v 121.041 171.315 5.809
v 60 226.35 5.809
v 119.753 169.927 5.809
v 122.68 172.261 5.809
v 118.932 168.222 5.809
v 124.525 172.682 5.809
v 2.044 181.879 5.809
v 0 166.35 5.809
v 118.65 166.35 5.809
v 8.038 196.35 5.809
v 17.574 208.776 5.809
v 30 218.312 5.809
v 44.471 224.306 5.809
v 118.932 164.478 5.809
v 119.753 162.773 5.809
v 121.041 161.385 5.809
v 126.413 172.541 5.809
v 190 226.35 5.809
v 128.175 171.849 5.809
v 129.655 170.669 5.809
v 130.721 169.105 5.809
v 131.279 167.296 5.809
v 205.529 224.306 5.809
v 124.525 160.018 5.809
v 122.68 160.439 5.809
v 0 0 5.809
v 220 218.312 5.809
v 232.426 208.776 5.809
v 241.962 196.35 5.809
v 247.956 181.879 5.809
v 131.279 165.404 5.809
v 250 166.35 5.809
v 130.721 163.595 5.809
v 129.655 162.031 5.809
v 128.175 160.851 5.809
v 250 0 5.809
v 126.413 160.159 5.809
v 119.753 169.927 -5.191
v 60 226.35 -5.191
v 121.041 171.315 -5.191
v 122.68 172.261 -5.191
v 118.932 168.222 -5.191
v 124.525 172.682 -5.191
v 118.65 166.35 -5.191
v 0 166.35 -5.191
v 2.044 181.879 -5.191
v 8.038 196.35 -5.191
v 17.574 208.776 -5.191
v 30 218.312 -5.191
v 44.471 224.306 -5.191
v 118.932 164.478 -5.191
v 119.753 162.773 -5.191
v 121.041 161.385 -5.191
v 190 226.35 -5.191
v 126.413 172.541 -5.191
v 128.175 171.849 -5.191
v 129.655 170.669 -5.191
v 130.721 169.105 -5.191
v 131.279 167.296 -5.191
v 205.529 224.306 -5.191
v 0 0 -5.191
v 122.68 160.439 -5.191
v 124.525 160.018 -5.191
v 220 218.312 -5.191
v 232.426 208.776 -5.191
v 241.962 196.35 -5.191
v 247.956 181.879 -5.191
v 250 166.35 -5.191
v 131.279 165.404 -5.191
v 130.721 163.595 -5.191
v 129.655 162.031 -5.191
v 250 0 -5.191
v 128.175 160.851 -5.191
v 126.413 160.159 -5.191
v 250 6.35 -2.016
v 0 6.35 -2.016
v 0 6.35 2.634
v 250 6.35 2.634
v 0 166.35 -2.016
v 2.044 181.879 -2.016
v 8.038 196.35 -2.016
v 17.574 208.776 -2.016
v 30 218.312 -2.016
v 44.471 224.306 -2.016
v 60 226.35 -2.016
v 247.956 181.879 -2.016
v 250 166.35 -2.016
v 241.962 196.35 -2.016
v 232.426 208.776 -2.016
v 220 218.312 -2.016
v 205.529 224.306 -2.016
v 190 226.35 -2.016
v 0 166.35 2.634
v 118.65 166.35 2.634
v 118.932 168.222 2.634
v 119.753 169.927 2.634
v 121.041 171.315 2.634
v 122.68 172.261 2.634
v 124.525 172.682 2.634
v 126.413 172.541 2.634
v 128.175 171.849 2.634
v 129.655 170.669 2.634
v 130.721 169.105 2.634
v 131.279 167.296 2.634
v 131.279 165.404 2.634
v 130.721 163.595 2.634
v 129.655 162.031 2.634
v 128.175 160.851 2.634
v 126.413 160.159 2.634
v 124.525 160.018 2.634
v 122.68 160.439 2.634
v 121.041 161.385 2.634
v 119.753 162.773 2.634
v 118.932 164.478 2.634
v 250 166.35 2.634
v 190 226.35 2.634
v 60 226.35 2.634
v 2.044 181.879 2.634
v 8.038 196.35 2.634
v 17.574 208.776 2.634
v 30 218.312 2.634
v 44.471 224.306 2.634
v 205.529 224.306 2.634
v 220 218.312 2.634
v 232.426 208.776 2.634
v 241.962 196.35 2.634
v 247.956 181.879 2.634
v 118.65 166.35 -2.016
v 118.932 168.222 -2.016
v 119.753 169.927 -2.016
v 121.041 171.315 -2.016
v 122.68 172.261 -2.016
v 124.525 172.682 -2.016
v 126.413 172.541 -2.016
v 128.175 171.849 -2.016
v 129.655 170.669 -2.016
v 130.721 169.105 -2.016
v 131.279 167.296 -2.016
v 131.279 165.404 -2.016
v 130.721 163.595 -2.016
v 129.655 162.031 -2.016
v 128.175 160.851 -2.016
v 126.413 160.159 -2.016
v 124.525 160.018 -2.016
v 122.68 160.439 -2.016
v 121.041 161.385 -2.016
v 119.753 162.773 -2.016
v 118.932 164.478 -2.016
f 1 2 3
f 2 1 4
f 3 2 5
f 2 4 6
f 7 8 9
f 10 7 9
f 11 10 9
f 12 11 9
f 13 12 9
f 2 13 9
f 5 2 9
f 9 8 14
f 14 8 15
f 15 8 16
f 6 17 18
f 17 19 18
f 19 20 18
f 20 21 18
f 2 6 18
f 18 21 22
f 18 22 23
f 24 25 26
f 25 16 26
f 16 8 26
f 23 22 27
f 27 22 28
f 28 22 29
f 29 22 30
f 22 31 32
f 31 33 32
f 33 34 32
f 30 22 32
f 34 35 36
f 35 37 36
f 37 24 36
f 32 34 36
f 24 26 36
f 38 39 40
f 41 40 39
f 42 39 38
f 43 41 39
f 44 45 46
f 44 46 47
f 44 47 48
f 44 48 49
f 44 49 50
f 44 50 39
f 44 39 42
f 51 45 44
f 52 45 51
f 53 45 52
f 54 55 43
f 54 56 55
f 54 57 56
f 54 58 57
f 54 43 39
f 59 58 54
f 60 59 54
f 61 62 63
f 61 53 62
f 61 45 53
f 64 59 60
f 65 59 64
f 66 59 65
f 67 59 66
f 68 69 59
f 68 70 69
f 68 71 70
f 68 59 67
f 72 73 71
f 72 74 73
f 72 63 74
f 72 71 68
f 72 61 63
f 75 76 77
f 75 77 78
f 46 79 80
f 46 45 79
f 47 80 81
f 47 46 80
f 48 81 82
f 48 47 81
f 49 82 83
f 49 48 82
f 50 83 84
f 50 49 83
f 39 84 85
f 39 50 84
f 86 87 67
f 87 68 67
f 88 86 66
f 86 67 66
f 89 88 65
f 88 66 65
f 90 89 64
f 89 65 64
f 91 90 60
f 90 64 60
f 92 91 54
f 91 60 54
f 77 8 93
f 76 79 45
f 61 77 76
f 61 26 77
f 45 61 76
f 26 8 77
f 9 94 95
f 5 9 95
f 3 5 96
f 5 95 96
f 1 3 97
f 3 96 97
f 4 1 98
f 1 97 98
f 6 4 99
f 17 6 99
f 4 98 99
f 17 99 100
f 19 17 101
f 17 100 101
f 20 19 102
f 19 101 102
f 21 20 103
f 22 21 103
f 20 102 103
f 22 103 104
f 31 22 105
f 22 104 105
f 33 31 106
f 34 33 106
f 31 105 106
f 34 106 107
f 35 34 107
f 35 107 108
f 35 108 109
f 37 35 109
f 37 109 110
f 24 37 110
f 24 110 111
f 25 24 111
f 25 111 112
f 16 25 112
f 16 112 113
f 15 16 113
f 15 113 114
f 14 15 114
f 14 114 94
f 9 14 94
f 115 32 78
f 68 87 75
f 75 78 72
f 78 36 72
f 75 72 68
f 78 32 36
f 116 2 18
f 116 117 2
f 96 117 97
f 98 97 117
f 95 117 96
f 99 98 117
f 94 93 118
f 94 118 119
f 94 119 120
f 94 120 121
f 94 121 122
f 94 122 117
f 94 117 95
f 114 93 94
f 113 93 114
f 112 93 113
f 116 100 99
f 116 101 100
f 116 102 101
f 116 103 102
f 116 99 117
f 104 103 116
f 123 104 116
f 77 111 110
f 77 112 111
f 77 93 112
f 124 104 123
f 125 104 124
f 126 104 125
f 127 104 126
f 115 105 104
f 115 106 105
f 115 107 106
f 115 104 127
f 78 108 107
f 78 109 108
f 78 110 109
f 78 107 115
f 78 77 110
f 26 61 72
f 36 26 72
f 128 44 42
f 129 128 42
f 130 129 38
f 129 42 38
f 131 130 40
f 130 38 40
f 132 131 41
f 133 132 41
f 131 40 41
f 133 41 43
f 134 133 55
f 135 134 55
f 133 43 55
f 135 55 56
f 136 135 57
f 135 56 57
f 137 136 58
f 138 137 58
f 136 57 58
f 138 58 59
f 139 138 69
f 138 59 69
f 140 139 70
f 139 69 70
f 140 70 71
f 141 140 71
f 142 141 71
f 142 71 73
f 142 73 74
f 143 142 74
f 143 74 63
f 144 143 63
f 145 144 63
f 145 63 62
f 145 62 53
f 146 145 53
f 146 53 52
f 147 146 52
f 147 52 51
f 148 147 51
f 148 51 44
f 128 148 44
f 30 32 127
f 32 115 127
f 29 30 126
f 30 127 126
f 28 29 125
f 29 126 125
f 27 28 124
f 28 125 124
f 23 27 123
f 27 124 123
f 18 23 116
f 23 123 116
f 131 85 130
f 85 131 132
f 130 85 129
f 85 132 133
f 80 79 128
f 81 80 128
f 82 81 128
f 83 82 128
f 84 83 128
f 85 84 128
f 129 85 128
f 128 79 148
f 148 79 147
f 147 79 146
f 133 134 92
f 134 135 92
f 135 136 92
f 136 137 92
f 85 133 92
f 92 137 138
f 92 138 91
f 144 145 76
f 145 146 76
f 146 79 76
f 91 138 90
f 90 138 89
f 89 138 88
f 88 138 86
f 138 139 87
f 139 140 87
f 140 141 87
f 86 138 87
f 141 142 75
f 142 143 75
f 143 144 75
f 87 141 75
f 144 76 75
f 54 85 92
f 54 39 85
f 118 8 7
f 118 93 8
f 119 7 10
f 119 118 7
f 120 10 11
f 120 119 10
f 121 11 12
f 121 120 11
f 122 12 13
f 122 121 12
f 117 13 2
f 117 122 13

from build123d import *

# Parameters (mm, degrees)
CROQUIS1_W              = 250
CROQUIS1_H              = 11
SALIENTE_EXTRUIR1_DEPTH = 6.35
CROQUIS2_W              = 250
CROQUIS2_H              = 3.175
SALIENTE_EXTRUIR2_DEPTH = 220
REDONDEO1_R             = 60
CROQUIS4_R              = 6.35
CORTAR_EXTRUIR1_DEPTH   = 11


with BuildPart() as part:
    # Croquis1 → Saliente-Extruir1 (new body)
    with BuildSketch(Plane(origin=(0, 0, 0), x_dir=(1, 0, 0), z_dir=(0, 1, 0))):
        with Locations((125, -0.308803141)):
            Rectangle(CROQUIS1_W, CROQUIS1_H)
    extrude(amount=SALIENTE_EXTRUIR1_DEPTH)

    # Croquis2 → Saliente-Extruir2 (add)
    with BuildSketch(Plane(origin=(0, 6.35, 0), x_dir=(1, 0, 0), z_dir=(0, 1, 0))):
        with Locations((125, 3.603696859)):
            Rectangle(CROQUIS2_W, CROQUIS2_H)
        with Locations((125, -4.221303141)):
            Rectangle(CROQUIS2_W, CROQUIS2_H)
    extrude(amount=SALIENTE_EXTRUIR2_DEPTH)

    # Redondeo1
    redondeo1_edges = [part.edges().sort_by_distance(p)[0] for p in [
        (250, 226.35, -3.603696859),
        (0, 226.35, -3.603696859),
        (0, 226.35, 4.221303141),
        (250, 226.35, 4.221303141),
    ]]
    fillet(redondeo1_edges, radius=REDONDEO1_R)

    # Croquis4 → Cortar-Extruir1 (cut)
    with BuildSketch(Plane(origin=(0, 0, -5.191196859), x_dir=(-1, 0, 0), z_dir=(0, 0, -1))):
        with Locations((-125, 166.35)):
            Circle(CROQUIS4_R)
    extrude(amount=-CORTAR_EXTRUIR1_DEPTH, mode=Mode.SUBTRACT)


solid = part.part
